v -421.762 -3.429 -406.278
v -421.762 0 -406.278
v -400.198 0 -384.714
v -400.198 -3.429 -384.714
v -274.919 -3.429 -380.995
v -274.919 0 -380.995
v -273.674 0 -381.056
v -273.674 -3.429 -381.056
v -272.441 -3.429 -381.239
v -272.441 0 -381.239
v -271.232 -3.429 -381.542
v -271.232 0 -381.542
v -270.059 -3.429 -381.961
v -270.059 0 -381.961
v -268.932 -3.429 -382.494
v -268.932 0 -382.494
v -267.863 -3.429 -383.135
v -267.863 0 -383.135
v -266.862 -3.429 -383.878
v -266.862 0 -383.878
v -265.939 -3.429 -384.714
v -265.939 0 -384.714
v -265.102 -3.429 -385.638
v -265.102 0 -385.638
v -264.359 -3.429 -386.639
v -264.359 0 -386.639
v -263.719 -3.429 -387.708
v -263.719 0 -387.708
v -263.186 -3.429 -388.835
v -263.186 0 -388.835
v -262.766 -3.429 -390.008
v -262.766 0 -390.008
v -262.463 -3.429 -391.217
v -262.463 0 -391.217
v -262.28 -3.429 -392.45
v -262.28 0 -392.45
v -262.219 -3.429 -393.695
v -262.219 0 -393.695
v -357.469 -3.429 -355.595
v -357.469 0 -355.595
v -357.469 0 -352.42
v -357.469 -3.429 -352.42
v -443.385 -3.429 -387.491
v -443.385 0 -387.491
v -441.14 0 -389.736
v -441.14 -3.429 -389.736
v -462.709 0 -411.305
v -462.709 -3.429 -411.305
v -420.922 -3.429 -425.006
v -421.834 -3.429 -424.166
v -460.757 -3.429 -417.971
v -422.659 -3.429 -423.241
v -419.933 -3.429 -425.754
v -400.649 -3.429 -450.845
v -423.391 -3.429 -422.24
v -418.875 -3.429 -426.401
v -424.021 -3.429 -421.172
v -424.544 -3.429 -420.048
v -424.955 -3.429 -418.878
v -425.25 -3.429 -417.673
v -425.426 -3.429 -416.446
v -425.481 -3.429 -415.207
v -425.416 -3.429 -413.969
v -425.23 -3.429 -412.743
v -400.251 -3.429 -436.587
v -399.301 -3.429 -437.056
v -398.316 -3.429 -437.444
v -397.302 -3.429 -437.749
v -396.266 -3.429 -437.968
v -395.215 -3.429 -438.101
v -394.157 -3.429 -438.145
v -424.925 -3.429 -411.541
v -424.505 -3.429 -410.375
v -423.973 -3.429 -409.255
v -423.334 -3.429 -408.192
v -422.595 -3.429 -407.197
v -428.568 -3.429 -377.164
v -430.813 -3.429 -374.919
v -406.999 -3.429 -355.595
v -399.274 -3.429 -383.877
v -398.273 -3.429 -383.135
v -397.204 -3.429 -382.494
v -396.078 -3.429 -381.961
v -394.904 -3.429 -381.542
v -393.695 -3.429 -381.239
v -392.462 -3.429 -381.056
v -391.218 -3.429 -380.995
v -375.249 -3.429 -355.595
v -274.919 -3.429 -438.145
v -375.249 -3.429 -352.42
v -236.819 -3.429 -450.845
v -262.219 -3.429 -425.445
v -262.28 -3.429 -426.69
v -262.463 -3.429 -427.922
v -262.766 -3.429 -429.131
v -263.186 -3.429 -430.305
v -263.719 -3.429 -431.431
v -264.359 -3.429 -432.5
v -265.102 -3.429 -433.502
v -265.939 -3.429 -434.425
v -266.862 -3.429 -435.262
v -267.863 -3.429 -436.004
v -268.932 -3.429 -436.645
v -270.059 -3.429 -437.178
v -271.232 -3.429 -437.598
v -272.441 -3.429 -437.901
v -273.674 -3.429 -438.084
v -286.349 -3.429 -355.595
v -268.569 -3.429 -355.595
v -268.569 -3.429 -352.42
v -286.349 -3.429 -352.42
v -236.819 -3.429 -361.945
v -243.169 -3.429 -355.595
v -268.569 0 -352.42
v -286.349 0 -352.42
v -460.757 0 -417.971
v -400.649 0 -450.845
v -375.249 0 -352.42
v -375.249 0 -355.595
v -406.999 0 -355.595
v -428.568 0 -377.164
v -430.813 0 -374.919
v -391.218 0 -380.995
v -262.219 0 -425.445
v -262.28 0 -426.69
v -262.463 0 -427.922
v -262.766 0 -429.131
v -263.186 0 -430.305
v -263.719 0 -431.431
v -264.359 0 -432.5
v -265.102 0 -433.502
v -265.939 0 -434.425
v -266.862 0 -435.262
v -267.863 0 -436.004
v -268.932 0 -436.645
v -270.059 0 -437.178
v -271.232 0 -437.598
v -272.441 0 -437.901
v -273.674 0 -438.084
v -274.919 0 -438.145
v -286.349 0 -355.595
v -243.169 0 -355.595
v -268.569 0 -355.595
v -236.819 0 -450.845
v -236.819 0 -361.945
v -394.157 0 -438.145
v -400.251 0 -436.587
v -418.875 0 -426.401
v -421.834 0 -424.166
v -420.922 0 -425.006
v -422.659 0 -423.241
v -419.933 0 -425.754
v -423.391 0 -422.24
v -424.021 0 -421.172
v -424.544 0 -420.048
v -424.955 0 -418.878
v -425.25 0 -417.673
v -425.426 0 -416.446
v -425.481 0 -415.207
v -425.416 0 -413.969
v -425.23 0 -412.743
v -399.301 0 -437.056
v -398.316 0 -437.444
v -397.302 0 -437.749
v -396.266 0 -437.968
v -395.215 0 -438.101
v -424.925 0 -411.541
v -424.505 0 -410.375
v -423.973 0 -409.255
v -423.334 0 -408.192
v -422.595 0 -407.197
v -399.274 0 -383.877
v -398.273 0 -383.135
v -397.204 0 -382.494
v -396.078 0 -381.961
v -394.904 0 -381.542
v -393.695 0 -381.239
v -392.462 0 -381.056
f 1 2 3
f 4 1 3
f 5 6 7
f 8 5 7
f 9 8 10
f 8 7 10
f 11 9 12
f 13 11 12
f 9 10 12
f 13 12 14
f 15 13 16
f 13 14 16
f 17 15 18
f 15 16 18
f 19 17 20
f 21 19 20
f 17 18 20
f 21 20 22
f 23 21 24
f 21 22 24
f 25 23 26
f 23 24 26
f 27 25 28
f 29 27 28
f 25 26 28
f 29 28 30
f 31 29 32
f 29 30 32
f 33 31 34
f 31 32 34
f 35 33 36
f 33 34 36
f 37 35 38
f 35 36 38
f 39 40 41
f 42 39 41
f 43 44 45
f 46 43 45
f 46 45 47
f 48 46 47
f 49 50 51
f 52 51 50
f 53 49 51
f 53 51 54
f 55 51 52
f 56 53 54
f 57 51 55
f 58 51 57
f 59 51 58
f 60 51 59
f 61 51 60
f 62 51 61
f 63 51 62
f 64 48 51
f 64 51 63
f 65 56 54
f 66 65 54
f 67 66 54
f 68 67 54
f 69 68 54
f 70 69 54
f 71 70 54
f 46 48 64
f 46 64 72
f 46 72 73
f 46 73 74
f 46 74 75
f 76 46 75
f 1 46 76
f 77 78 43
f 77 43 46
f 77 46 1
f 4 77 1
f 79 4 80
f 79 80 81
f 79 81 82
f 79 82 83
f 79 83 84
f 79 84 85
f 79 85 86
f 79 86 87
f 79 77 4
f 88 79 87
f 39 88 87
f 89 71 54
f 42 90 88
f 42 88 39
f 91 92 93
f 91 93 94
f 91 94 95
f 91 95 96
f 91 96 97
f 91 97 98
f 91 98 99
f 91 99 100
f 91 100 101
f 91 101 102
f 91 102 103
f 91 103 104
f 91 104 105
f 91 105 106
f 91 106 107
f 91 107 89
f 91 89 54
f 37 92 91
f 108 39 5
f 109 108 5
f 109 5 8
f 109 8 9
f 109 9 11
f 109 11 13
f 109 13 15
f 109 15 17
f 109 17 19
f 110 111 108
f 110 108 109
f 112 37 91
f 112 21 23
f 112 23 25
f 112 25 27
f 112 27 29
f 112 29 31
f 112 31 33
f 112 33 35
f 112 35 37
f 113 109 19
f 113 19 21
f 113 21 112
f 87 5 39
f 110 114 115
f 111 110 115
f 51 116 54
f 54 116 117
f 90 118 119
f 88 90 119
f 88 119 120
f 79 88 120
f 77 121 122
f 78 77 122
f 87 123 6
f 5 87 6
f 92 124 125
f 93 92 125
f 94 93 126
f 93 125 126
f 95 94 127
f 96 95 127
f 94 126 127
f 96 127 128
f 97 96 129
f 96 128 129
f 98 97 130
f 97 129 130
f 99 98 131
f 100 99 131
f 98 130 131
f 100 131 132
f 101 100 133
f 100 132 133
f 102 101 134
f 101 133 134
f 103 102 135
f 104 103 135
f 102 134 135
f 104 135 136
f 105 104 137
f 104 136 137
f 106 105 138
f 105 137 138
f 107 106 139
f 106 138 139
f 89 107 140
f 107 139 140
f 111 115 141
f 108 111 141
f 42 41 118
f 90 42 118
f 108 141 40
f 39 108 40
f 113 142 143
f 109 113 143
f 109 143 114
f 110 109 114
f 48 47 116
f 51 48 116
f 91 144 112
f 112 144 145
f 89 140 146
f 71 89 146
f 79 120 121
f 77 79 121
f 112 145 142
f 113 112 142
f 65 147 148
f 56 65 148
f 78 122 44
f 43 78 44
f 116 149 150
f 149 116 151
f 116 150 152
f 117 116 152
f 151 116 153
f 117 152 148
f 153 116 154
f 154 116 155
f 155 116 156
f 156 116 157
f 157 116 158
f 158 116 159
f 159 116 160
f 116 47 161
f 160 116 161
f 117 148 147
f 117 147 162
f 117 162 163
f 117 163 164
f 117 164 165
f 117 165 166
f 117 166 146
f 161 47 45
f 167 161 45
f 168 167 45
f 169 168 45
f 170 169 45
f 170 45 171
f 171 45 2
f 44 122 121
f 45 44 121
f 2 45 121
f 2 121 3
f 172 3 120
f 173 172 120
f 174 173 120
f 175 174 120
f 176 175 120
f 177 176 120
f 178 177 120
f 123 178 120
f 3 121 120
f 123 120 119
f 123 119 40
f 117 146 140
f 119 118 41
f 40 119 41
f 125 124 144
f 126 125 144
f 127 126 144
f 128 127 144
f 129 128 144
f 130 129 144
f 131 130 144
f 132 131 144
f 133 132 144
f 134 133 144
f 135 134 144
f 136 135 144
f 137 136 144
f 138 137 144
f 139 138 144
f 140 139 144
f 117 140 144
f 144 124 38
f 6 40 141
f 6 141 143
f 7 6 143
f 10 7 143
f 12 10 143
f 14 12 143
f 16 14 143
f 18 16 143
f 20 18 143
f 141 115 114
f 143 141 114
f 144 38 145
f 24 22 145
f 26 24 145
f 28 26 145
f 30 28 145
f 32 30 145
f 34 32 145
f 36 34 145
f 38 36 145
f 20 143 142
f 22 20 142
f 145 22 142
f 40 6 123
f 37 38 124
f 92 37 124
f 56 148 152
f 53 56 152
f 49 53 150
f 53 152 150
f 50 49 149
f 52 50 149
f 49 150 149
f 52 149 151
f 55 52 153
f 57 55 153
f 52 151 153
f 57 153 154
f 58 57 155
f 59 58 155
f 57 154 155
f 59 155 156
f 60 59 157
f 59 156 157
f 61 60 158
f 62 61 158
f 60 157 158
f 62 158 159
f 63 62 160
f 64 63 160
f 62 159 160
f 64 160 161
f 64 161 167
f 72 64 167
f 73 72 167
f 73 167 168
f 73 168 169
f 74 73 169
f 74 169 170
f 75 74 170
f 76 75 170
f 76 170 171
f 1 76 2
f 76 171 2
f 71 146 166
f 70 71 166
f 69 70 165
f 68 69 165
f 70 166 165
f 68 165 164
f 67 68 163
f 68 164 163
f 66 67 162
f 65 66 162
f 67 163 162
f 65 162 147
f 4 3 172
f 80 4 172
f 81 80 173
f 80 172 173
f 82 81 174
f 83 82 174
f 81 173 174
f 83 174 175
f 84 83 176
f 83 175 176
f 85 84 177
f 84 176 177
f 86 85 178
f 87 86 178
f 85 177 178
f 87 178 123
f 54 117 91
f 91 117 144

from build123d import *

# Parameters (mm, degrees)
F1_DEPTH = 3.429


# Not quite as in the source:
# - ends of sketch curves that miss each other by under 0.0002 mm in the source are joined


with BuildPart() as f1:
    # F0 (on Front) → F1 (new body)
    with BuildSketch(Plane.XZ):
        Polygon((-357.469059, -352.4197422), (-375.249059, -352.4197422), (-375.249059, -355.5947422), (-406.999059, -355.5947422), (-428.5679516, -377.1636348), (-430.8130322, -374.9185542), (-443.3853718, -387.4909192), (-441.1403166, -389.7359998), (-462.7092092, -411.3048924), (-460.7568382, -417.970716), (-400.649059, -450.8447422), (-236.819059, -450.8447422), (-236.819059, -361.9447422), (-243.169059, -355.5947422), (-268.569059, -355.5947422), (-268.569059, -352.4197422), (-286.349059, -352.4197422), (-286.349059, -355.5947422), (-357.469059, -355.5947422), align=None)
        with BuildLine():
            ThreePointArc((-418.8754328238, -426.4010670387), (-425.3527857587, -417.0618193312), (-421.7617140211, -406.2784129789))
            Line((-421.7617140211, -406.2784129789), (-400.1977772, -384.7144706))
            ThreePointArc((-400.1977772, -384.7144706), (-396.0776022944, -381.9614687005), (-391.217531, -380.9947422))
            Line((-391.217531, -380.9947422), (-274.919059, -380.9947422))
            ThreePointArc((-274.919059, -380.9947422), (-265.9388028789, -384.7144860789), (-262.219059, -393.6947422))
            Line((-262.219059, -393.6947422), (-262.219059, -425.4447422))
            ThreePointArc((-262.219059, -425.4447422), (-265.9388028789, -434.4249983211), (-274.919059, -438.1447422))
            Line((-274.919059, -438.1447422), (-394.1569714, -438.1447422))
            ThreePointArc((-394.1569714, -438.1447422), (-397.3019244332, -437.7491832852), (-400.250969717, -436.5871469904))
            Line((-400.250969717, -436.5871469904), (-418.8754328238, -426.4010670387))
        make_face(mode=Mode.SUBTRACT)
    extrude(amount=F1_DEPTH)


solid = f1.part
